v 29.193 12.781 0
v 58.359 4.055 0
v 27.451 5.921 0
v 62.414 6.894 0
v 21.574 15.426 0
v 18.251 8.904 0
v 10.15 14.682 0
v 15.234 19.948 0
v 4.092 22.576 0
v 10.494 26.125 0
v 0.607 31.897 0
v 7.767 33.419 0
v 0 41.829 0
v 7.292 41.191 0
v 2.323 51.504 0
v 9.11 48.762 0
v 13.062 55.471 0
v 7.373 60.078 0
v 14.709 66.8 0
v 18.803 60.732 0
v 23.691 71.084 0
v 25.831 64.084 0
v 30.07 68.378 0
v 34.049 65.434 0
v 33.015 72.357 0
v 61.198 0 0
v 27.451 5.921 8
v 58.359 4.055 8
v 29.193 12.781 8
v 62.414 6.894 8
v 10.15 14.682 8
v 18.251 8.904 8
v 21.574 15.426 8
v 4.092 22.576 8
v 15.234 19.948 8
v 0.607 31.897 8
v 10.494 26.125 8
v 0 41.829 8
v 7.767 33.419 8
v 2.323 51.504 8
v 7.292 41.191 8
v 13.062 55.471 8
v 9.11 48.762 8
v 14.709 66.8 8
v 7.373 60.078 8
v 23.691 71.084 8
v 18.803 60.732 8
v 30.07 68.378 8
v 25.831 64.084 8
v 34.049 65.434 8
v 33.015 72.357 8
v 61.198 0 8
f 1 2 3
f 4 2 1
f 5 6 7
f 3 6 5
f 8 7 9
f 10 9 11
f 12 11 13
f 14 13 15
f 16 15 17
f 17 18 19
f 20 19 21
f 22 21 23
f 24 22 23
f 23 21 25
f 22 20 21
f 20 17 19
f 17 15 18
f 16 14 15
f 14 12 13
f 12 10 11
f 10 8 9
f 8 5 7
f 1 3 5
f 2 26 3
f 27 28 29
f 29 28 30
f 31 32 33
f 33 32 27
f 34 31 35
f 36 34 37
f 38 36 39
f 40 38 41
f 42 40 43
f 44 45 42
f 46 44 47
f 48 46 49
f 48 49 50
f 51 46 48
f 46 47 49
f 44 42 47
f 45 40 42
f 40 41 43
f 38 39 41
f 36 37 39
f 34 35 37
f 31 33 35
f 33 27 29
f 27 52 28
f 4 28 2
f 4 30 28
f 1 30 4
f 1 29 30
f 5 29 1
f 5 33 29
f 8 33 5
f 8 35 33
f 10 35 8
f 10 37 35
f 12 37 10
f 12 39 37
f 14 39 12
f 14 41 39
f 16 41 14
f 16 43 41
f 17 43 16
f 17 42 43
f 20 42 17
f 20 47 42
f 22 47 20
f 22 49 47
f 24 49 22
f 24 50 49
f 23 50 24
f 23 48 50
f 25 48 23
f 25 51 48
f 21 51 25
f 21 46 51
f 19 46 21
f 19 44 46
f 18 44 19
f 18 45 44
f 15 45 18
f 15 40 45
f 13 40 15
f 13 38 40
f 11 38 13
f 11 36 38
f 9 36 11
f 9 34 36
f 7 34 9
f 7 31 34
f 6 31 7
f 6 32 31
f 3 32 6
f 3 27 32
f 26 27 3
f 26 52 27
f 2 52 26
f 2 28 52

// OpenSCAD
$fn = 32;

// ----------------------------------------------------------------------
// Hook plate: curl radius 30 mm over 170 degrees, 7 mm thick band
// ----------------------------------------------------------------------

// --- parameters (mm) ---
profile_height = 8;       // extrusion height
profile_points = 26;      // points of the closed outline

profile = [[30.07, 68.378], [33.015, 72.357], [23.691, 71.084], [14.709, 66.8], [7.373, 60.078], [2.323, 51.504], [0, 41.829], [0.607, 31.897], [4.092, 22.576], [10.15, 14.682], [18.251, 8.904], [27.451, 5.921], [61.198, 0], [58.359, 4.055], [62.414, 6.894], [29.193, 12.781], [21.574, 15.426], [15.234, 19.948], [10.494, 26.125], [7.767, 33.419], [7.292, 41.191], [9.11, 48.762], [13.062, 55.471], [18.803, 60.732], [25.831, 64.084], [34.049, 65.434]];  // single closed polygon, 26 points, counter clockwise

// --- the one profile operation ---
linear_extrude(height = profile_height) polygon(points = profile);
